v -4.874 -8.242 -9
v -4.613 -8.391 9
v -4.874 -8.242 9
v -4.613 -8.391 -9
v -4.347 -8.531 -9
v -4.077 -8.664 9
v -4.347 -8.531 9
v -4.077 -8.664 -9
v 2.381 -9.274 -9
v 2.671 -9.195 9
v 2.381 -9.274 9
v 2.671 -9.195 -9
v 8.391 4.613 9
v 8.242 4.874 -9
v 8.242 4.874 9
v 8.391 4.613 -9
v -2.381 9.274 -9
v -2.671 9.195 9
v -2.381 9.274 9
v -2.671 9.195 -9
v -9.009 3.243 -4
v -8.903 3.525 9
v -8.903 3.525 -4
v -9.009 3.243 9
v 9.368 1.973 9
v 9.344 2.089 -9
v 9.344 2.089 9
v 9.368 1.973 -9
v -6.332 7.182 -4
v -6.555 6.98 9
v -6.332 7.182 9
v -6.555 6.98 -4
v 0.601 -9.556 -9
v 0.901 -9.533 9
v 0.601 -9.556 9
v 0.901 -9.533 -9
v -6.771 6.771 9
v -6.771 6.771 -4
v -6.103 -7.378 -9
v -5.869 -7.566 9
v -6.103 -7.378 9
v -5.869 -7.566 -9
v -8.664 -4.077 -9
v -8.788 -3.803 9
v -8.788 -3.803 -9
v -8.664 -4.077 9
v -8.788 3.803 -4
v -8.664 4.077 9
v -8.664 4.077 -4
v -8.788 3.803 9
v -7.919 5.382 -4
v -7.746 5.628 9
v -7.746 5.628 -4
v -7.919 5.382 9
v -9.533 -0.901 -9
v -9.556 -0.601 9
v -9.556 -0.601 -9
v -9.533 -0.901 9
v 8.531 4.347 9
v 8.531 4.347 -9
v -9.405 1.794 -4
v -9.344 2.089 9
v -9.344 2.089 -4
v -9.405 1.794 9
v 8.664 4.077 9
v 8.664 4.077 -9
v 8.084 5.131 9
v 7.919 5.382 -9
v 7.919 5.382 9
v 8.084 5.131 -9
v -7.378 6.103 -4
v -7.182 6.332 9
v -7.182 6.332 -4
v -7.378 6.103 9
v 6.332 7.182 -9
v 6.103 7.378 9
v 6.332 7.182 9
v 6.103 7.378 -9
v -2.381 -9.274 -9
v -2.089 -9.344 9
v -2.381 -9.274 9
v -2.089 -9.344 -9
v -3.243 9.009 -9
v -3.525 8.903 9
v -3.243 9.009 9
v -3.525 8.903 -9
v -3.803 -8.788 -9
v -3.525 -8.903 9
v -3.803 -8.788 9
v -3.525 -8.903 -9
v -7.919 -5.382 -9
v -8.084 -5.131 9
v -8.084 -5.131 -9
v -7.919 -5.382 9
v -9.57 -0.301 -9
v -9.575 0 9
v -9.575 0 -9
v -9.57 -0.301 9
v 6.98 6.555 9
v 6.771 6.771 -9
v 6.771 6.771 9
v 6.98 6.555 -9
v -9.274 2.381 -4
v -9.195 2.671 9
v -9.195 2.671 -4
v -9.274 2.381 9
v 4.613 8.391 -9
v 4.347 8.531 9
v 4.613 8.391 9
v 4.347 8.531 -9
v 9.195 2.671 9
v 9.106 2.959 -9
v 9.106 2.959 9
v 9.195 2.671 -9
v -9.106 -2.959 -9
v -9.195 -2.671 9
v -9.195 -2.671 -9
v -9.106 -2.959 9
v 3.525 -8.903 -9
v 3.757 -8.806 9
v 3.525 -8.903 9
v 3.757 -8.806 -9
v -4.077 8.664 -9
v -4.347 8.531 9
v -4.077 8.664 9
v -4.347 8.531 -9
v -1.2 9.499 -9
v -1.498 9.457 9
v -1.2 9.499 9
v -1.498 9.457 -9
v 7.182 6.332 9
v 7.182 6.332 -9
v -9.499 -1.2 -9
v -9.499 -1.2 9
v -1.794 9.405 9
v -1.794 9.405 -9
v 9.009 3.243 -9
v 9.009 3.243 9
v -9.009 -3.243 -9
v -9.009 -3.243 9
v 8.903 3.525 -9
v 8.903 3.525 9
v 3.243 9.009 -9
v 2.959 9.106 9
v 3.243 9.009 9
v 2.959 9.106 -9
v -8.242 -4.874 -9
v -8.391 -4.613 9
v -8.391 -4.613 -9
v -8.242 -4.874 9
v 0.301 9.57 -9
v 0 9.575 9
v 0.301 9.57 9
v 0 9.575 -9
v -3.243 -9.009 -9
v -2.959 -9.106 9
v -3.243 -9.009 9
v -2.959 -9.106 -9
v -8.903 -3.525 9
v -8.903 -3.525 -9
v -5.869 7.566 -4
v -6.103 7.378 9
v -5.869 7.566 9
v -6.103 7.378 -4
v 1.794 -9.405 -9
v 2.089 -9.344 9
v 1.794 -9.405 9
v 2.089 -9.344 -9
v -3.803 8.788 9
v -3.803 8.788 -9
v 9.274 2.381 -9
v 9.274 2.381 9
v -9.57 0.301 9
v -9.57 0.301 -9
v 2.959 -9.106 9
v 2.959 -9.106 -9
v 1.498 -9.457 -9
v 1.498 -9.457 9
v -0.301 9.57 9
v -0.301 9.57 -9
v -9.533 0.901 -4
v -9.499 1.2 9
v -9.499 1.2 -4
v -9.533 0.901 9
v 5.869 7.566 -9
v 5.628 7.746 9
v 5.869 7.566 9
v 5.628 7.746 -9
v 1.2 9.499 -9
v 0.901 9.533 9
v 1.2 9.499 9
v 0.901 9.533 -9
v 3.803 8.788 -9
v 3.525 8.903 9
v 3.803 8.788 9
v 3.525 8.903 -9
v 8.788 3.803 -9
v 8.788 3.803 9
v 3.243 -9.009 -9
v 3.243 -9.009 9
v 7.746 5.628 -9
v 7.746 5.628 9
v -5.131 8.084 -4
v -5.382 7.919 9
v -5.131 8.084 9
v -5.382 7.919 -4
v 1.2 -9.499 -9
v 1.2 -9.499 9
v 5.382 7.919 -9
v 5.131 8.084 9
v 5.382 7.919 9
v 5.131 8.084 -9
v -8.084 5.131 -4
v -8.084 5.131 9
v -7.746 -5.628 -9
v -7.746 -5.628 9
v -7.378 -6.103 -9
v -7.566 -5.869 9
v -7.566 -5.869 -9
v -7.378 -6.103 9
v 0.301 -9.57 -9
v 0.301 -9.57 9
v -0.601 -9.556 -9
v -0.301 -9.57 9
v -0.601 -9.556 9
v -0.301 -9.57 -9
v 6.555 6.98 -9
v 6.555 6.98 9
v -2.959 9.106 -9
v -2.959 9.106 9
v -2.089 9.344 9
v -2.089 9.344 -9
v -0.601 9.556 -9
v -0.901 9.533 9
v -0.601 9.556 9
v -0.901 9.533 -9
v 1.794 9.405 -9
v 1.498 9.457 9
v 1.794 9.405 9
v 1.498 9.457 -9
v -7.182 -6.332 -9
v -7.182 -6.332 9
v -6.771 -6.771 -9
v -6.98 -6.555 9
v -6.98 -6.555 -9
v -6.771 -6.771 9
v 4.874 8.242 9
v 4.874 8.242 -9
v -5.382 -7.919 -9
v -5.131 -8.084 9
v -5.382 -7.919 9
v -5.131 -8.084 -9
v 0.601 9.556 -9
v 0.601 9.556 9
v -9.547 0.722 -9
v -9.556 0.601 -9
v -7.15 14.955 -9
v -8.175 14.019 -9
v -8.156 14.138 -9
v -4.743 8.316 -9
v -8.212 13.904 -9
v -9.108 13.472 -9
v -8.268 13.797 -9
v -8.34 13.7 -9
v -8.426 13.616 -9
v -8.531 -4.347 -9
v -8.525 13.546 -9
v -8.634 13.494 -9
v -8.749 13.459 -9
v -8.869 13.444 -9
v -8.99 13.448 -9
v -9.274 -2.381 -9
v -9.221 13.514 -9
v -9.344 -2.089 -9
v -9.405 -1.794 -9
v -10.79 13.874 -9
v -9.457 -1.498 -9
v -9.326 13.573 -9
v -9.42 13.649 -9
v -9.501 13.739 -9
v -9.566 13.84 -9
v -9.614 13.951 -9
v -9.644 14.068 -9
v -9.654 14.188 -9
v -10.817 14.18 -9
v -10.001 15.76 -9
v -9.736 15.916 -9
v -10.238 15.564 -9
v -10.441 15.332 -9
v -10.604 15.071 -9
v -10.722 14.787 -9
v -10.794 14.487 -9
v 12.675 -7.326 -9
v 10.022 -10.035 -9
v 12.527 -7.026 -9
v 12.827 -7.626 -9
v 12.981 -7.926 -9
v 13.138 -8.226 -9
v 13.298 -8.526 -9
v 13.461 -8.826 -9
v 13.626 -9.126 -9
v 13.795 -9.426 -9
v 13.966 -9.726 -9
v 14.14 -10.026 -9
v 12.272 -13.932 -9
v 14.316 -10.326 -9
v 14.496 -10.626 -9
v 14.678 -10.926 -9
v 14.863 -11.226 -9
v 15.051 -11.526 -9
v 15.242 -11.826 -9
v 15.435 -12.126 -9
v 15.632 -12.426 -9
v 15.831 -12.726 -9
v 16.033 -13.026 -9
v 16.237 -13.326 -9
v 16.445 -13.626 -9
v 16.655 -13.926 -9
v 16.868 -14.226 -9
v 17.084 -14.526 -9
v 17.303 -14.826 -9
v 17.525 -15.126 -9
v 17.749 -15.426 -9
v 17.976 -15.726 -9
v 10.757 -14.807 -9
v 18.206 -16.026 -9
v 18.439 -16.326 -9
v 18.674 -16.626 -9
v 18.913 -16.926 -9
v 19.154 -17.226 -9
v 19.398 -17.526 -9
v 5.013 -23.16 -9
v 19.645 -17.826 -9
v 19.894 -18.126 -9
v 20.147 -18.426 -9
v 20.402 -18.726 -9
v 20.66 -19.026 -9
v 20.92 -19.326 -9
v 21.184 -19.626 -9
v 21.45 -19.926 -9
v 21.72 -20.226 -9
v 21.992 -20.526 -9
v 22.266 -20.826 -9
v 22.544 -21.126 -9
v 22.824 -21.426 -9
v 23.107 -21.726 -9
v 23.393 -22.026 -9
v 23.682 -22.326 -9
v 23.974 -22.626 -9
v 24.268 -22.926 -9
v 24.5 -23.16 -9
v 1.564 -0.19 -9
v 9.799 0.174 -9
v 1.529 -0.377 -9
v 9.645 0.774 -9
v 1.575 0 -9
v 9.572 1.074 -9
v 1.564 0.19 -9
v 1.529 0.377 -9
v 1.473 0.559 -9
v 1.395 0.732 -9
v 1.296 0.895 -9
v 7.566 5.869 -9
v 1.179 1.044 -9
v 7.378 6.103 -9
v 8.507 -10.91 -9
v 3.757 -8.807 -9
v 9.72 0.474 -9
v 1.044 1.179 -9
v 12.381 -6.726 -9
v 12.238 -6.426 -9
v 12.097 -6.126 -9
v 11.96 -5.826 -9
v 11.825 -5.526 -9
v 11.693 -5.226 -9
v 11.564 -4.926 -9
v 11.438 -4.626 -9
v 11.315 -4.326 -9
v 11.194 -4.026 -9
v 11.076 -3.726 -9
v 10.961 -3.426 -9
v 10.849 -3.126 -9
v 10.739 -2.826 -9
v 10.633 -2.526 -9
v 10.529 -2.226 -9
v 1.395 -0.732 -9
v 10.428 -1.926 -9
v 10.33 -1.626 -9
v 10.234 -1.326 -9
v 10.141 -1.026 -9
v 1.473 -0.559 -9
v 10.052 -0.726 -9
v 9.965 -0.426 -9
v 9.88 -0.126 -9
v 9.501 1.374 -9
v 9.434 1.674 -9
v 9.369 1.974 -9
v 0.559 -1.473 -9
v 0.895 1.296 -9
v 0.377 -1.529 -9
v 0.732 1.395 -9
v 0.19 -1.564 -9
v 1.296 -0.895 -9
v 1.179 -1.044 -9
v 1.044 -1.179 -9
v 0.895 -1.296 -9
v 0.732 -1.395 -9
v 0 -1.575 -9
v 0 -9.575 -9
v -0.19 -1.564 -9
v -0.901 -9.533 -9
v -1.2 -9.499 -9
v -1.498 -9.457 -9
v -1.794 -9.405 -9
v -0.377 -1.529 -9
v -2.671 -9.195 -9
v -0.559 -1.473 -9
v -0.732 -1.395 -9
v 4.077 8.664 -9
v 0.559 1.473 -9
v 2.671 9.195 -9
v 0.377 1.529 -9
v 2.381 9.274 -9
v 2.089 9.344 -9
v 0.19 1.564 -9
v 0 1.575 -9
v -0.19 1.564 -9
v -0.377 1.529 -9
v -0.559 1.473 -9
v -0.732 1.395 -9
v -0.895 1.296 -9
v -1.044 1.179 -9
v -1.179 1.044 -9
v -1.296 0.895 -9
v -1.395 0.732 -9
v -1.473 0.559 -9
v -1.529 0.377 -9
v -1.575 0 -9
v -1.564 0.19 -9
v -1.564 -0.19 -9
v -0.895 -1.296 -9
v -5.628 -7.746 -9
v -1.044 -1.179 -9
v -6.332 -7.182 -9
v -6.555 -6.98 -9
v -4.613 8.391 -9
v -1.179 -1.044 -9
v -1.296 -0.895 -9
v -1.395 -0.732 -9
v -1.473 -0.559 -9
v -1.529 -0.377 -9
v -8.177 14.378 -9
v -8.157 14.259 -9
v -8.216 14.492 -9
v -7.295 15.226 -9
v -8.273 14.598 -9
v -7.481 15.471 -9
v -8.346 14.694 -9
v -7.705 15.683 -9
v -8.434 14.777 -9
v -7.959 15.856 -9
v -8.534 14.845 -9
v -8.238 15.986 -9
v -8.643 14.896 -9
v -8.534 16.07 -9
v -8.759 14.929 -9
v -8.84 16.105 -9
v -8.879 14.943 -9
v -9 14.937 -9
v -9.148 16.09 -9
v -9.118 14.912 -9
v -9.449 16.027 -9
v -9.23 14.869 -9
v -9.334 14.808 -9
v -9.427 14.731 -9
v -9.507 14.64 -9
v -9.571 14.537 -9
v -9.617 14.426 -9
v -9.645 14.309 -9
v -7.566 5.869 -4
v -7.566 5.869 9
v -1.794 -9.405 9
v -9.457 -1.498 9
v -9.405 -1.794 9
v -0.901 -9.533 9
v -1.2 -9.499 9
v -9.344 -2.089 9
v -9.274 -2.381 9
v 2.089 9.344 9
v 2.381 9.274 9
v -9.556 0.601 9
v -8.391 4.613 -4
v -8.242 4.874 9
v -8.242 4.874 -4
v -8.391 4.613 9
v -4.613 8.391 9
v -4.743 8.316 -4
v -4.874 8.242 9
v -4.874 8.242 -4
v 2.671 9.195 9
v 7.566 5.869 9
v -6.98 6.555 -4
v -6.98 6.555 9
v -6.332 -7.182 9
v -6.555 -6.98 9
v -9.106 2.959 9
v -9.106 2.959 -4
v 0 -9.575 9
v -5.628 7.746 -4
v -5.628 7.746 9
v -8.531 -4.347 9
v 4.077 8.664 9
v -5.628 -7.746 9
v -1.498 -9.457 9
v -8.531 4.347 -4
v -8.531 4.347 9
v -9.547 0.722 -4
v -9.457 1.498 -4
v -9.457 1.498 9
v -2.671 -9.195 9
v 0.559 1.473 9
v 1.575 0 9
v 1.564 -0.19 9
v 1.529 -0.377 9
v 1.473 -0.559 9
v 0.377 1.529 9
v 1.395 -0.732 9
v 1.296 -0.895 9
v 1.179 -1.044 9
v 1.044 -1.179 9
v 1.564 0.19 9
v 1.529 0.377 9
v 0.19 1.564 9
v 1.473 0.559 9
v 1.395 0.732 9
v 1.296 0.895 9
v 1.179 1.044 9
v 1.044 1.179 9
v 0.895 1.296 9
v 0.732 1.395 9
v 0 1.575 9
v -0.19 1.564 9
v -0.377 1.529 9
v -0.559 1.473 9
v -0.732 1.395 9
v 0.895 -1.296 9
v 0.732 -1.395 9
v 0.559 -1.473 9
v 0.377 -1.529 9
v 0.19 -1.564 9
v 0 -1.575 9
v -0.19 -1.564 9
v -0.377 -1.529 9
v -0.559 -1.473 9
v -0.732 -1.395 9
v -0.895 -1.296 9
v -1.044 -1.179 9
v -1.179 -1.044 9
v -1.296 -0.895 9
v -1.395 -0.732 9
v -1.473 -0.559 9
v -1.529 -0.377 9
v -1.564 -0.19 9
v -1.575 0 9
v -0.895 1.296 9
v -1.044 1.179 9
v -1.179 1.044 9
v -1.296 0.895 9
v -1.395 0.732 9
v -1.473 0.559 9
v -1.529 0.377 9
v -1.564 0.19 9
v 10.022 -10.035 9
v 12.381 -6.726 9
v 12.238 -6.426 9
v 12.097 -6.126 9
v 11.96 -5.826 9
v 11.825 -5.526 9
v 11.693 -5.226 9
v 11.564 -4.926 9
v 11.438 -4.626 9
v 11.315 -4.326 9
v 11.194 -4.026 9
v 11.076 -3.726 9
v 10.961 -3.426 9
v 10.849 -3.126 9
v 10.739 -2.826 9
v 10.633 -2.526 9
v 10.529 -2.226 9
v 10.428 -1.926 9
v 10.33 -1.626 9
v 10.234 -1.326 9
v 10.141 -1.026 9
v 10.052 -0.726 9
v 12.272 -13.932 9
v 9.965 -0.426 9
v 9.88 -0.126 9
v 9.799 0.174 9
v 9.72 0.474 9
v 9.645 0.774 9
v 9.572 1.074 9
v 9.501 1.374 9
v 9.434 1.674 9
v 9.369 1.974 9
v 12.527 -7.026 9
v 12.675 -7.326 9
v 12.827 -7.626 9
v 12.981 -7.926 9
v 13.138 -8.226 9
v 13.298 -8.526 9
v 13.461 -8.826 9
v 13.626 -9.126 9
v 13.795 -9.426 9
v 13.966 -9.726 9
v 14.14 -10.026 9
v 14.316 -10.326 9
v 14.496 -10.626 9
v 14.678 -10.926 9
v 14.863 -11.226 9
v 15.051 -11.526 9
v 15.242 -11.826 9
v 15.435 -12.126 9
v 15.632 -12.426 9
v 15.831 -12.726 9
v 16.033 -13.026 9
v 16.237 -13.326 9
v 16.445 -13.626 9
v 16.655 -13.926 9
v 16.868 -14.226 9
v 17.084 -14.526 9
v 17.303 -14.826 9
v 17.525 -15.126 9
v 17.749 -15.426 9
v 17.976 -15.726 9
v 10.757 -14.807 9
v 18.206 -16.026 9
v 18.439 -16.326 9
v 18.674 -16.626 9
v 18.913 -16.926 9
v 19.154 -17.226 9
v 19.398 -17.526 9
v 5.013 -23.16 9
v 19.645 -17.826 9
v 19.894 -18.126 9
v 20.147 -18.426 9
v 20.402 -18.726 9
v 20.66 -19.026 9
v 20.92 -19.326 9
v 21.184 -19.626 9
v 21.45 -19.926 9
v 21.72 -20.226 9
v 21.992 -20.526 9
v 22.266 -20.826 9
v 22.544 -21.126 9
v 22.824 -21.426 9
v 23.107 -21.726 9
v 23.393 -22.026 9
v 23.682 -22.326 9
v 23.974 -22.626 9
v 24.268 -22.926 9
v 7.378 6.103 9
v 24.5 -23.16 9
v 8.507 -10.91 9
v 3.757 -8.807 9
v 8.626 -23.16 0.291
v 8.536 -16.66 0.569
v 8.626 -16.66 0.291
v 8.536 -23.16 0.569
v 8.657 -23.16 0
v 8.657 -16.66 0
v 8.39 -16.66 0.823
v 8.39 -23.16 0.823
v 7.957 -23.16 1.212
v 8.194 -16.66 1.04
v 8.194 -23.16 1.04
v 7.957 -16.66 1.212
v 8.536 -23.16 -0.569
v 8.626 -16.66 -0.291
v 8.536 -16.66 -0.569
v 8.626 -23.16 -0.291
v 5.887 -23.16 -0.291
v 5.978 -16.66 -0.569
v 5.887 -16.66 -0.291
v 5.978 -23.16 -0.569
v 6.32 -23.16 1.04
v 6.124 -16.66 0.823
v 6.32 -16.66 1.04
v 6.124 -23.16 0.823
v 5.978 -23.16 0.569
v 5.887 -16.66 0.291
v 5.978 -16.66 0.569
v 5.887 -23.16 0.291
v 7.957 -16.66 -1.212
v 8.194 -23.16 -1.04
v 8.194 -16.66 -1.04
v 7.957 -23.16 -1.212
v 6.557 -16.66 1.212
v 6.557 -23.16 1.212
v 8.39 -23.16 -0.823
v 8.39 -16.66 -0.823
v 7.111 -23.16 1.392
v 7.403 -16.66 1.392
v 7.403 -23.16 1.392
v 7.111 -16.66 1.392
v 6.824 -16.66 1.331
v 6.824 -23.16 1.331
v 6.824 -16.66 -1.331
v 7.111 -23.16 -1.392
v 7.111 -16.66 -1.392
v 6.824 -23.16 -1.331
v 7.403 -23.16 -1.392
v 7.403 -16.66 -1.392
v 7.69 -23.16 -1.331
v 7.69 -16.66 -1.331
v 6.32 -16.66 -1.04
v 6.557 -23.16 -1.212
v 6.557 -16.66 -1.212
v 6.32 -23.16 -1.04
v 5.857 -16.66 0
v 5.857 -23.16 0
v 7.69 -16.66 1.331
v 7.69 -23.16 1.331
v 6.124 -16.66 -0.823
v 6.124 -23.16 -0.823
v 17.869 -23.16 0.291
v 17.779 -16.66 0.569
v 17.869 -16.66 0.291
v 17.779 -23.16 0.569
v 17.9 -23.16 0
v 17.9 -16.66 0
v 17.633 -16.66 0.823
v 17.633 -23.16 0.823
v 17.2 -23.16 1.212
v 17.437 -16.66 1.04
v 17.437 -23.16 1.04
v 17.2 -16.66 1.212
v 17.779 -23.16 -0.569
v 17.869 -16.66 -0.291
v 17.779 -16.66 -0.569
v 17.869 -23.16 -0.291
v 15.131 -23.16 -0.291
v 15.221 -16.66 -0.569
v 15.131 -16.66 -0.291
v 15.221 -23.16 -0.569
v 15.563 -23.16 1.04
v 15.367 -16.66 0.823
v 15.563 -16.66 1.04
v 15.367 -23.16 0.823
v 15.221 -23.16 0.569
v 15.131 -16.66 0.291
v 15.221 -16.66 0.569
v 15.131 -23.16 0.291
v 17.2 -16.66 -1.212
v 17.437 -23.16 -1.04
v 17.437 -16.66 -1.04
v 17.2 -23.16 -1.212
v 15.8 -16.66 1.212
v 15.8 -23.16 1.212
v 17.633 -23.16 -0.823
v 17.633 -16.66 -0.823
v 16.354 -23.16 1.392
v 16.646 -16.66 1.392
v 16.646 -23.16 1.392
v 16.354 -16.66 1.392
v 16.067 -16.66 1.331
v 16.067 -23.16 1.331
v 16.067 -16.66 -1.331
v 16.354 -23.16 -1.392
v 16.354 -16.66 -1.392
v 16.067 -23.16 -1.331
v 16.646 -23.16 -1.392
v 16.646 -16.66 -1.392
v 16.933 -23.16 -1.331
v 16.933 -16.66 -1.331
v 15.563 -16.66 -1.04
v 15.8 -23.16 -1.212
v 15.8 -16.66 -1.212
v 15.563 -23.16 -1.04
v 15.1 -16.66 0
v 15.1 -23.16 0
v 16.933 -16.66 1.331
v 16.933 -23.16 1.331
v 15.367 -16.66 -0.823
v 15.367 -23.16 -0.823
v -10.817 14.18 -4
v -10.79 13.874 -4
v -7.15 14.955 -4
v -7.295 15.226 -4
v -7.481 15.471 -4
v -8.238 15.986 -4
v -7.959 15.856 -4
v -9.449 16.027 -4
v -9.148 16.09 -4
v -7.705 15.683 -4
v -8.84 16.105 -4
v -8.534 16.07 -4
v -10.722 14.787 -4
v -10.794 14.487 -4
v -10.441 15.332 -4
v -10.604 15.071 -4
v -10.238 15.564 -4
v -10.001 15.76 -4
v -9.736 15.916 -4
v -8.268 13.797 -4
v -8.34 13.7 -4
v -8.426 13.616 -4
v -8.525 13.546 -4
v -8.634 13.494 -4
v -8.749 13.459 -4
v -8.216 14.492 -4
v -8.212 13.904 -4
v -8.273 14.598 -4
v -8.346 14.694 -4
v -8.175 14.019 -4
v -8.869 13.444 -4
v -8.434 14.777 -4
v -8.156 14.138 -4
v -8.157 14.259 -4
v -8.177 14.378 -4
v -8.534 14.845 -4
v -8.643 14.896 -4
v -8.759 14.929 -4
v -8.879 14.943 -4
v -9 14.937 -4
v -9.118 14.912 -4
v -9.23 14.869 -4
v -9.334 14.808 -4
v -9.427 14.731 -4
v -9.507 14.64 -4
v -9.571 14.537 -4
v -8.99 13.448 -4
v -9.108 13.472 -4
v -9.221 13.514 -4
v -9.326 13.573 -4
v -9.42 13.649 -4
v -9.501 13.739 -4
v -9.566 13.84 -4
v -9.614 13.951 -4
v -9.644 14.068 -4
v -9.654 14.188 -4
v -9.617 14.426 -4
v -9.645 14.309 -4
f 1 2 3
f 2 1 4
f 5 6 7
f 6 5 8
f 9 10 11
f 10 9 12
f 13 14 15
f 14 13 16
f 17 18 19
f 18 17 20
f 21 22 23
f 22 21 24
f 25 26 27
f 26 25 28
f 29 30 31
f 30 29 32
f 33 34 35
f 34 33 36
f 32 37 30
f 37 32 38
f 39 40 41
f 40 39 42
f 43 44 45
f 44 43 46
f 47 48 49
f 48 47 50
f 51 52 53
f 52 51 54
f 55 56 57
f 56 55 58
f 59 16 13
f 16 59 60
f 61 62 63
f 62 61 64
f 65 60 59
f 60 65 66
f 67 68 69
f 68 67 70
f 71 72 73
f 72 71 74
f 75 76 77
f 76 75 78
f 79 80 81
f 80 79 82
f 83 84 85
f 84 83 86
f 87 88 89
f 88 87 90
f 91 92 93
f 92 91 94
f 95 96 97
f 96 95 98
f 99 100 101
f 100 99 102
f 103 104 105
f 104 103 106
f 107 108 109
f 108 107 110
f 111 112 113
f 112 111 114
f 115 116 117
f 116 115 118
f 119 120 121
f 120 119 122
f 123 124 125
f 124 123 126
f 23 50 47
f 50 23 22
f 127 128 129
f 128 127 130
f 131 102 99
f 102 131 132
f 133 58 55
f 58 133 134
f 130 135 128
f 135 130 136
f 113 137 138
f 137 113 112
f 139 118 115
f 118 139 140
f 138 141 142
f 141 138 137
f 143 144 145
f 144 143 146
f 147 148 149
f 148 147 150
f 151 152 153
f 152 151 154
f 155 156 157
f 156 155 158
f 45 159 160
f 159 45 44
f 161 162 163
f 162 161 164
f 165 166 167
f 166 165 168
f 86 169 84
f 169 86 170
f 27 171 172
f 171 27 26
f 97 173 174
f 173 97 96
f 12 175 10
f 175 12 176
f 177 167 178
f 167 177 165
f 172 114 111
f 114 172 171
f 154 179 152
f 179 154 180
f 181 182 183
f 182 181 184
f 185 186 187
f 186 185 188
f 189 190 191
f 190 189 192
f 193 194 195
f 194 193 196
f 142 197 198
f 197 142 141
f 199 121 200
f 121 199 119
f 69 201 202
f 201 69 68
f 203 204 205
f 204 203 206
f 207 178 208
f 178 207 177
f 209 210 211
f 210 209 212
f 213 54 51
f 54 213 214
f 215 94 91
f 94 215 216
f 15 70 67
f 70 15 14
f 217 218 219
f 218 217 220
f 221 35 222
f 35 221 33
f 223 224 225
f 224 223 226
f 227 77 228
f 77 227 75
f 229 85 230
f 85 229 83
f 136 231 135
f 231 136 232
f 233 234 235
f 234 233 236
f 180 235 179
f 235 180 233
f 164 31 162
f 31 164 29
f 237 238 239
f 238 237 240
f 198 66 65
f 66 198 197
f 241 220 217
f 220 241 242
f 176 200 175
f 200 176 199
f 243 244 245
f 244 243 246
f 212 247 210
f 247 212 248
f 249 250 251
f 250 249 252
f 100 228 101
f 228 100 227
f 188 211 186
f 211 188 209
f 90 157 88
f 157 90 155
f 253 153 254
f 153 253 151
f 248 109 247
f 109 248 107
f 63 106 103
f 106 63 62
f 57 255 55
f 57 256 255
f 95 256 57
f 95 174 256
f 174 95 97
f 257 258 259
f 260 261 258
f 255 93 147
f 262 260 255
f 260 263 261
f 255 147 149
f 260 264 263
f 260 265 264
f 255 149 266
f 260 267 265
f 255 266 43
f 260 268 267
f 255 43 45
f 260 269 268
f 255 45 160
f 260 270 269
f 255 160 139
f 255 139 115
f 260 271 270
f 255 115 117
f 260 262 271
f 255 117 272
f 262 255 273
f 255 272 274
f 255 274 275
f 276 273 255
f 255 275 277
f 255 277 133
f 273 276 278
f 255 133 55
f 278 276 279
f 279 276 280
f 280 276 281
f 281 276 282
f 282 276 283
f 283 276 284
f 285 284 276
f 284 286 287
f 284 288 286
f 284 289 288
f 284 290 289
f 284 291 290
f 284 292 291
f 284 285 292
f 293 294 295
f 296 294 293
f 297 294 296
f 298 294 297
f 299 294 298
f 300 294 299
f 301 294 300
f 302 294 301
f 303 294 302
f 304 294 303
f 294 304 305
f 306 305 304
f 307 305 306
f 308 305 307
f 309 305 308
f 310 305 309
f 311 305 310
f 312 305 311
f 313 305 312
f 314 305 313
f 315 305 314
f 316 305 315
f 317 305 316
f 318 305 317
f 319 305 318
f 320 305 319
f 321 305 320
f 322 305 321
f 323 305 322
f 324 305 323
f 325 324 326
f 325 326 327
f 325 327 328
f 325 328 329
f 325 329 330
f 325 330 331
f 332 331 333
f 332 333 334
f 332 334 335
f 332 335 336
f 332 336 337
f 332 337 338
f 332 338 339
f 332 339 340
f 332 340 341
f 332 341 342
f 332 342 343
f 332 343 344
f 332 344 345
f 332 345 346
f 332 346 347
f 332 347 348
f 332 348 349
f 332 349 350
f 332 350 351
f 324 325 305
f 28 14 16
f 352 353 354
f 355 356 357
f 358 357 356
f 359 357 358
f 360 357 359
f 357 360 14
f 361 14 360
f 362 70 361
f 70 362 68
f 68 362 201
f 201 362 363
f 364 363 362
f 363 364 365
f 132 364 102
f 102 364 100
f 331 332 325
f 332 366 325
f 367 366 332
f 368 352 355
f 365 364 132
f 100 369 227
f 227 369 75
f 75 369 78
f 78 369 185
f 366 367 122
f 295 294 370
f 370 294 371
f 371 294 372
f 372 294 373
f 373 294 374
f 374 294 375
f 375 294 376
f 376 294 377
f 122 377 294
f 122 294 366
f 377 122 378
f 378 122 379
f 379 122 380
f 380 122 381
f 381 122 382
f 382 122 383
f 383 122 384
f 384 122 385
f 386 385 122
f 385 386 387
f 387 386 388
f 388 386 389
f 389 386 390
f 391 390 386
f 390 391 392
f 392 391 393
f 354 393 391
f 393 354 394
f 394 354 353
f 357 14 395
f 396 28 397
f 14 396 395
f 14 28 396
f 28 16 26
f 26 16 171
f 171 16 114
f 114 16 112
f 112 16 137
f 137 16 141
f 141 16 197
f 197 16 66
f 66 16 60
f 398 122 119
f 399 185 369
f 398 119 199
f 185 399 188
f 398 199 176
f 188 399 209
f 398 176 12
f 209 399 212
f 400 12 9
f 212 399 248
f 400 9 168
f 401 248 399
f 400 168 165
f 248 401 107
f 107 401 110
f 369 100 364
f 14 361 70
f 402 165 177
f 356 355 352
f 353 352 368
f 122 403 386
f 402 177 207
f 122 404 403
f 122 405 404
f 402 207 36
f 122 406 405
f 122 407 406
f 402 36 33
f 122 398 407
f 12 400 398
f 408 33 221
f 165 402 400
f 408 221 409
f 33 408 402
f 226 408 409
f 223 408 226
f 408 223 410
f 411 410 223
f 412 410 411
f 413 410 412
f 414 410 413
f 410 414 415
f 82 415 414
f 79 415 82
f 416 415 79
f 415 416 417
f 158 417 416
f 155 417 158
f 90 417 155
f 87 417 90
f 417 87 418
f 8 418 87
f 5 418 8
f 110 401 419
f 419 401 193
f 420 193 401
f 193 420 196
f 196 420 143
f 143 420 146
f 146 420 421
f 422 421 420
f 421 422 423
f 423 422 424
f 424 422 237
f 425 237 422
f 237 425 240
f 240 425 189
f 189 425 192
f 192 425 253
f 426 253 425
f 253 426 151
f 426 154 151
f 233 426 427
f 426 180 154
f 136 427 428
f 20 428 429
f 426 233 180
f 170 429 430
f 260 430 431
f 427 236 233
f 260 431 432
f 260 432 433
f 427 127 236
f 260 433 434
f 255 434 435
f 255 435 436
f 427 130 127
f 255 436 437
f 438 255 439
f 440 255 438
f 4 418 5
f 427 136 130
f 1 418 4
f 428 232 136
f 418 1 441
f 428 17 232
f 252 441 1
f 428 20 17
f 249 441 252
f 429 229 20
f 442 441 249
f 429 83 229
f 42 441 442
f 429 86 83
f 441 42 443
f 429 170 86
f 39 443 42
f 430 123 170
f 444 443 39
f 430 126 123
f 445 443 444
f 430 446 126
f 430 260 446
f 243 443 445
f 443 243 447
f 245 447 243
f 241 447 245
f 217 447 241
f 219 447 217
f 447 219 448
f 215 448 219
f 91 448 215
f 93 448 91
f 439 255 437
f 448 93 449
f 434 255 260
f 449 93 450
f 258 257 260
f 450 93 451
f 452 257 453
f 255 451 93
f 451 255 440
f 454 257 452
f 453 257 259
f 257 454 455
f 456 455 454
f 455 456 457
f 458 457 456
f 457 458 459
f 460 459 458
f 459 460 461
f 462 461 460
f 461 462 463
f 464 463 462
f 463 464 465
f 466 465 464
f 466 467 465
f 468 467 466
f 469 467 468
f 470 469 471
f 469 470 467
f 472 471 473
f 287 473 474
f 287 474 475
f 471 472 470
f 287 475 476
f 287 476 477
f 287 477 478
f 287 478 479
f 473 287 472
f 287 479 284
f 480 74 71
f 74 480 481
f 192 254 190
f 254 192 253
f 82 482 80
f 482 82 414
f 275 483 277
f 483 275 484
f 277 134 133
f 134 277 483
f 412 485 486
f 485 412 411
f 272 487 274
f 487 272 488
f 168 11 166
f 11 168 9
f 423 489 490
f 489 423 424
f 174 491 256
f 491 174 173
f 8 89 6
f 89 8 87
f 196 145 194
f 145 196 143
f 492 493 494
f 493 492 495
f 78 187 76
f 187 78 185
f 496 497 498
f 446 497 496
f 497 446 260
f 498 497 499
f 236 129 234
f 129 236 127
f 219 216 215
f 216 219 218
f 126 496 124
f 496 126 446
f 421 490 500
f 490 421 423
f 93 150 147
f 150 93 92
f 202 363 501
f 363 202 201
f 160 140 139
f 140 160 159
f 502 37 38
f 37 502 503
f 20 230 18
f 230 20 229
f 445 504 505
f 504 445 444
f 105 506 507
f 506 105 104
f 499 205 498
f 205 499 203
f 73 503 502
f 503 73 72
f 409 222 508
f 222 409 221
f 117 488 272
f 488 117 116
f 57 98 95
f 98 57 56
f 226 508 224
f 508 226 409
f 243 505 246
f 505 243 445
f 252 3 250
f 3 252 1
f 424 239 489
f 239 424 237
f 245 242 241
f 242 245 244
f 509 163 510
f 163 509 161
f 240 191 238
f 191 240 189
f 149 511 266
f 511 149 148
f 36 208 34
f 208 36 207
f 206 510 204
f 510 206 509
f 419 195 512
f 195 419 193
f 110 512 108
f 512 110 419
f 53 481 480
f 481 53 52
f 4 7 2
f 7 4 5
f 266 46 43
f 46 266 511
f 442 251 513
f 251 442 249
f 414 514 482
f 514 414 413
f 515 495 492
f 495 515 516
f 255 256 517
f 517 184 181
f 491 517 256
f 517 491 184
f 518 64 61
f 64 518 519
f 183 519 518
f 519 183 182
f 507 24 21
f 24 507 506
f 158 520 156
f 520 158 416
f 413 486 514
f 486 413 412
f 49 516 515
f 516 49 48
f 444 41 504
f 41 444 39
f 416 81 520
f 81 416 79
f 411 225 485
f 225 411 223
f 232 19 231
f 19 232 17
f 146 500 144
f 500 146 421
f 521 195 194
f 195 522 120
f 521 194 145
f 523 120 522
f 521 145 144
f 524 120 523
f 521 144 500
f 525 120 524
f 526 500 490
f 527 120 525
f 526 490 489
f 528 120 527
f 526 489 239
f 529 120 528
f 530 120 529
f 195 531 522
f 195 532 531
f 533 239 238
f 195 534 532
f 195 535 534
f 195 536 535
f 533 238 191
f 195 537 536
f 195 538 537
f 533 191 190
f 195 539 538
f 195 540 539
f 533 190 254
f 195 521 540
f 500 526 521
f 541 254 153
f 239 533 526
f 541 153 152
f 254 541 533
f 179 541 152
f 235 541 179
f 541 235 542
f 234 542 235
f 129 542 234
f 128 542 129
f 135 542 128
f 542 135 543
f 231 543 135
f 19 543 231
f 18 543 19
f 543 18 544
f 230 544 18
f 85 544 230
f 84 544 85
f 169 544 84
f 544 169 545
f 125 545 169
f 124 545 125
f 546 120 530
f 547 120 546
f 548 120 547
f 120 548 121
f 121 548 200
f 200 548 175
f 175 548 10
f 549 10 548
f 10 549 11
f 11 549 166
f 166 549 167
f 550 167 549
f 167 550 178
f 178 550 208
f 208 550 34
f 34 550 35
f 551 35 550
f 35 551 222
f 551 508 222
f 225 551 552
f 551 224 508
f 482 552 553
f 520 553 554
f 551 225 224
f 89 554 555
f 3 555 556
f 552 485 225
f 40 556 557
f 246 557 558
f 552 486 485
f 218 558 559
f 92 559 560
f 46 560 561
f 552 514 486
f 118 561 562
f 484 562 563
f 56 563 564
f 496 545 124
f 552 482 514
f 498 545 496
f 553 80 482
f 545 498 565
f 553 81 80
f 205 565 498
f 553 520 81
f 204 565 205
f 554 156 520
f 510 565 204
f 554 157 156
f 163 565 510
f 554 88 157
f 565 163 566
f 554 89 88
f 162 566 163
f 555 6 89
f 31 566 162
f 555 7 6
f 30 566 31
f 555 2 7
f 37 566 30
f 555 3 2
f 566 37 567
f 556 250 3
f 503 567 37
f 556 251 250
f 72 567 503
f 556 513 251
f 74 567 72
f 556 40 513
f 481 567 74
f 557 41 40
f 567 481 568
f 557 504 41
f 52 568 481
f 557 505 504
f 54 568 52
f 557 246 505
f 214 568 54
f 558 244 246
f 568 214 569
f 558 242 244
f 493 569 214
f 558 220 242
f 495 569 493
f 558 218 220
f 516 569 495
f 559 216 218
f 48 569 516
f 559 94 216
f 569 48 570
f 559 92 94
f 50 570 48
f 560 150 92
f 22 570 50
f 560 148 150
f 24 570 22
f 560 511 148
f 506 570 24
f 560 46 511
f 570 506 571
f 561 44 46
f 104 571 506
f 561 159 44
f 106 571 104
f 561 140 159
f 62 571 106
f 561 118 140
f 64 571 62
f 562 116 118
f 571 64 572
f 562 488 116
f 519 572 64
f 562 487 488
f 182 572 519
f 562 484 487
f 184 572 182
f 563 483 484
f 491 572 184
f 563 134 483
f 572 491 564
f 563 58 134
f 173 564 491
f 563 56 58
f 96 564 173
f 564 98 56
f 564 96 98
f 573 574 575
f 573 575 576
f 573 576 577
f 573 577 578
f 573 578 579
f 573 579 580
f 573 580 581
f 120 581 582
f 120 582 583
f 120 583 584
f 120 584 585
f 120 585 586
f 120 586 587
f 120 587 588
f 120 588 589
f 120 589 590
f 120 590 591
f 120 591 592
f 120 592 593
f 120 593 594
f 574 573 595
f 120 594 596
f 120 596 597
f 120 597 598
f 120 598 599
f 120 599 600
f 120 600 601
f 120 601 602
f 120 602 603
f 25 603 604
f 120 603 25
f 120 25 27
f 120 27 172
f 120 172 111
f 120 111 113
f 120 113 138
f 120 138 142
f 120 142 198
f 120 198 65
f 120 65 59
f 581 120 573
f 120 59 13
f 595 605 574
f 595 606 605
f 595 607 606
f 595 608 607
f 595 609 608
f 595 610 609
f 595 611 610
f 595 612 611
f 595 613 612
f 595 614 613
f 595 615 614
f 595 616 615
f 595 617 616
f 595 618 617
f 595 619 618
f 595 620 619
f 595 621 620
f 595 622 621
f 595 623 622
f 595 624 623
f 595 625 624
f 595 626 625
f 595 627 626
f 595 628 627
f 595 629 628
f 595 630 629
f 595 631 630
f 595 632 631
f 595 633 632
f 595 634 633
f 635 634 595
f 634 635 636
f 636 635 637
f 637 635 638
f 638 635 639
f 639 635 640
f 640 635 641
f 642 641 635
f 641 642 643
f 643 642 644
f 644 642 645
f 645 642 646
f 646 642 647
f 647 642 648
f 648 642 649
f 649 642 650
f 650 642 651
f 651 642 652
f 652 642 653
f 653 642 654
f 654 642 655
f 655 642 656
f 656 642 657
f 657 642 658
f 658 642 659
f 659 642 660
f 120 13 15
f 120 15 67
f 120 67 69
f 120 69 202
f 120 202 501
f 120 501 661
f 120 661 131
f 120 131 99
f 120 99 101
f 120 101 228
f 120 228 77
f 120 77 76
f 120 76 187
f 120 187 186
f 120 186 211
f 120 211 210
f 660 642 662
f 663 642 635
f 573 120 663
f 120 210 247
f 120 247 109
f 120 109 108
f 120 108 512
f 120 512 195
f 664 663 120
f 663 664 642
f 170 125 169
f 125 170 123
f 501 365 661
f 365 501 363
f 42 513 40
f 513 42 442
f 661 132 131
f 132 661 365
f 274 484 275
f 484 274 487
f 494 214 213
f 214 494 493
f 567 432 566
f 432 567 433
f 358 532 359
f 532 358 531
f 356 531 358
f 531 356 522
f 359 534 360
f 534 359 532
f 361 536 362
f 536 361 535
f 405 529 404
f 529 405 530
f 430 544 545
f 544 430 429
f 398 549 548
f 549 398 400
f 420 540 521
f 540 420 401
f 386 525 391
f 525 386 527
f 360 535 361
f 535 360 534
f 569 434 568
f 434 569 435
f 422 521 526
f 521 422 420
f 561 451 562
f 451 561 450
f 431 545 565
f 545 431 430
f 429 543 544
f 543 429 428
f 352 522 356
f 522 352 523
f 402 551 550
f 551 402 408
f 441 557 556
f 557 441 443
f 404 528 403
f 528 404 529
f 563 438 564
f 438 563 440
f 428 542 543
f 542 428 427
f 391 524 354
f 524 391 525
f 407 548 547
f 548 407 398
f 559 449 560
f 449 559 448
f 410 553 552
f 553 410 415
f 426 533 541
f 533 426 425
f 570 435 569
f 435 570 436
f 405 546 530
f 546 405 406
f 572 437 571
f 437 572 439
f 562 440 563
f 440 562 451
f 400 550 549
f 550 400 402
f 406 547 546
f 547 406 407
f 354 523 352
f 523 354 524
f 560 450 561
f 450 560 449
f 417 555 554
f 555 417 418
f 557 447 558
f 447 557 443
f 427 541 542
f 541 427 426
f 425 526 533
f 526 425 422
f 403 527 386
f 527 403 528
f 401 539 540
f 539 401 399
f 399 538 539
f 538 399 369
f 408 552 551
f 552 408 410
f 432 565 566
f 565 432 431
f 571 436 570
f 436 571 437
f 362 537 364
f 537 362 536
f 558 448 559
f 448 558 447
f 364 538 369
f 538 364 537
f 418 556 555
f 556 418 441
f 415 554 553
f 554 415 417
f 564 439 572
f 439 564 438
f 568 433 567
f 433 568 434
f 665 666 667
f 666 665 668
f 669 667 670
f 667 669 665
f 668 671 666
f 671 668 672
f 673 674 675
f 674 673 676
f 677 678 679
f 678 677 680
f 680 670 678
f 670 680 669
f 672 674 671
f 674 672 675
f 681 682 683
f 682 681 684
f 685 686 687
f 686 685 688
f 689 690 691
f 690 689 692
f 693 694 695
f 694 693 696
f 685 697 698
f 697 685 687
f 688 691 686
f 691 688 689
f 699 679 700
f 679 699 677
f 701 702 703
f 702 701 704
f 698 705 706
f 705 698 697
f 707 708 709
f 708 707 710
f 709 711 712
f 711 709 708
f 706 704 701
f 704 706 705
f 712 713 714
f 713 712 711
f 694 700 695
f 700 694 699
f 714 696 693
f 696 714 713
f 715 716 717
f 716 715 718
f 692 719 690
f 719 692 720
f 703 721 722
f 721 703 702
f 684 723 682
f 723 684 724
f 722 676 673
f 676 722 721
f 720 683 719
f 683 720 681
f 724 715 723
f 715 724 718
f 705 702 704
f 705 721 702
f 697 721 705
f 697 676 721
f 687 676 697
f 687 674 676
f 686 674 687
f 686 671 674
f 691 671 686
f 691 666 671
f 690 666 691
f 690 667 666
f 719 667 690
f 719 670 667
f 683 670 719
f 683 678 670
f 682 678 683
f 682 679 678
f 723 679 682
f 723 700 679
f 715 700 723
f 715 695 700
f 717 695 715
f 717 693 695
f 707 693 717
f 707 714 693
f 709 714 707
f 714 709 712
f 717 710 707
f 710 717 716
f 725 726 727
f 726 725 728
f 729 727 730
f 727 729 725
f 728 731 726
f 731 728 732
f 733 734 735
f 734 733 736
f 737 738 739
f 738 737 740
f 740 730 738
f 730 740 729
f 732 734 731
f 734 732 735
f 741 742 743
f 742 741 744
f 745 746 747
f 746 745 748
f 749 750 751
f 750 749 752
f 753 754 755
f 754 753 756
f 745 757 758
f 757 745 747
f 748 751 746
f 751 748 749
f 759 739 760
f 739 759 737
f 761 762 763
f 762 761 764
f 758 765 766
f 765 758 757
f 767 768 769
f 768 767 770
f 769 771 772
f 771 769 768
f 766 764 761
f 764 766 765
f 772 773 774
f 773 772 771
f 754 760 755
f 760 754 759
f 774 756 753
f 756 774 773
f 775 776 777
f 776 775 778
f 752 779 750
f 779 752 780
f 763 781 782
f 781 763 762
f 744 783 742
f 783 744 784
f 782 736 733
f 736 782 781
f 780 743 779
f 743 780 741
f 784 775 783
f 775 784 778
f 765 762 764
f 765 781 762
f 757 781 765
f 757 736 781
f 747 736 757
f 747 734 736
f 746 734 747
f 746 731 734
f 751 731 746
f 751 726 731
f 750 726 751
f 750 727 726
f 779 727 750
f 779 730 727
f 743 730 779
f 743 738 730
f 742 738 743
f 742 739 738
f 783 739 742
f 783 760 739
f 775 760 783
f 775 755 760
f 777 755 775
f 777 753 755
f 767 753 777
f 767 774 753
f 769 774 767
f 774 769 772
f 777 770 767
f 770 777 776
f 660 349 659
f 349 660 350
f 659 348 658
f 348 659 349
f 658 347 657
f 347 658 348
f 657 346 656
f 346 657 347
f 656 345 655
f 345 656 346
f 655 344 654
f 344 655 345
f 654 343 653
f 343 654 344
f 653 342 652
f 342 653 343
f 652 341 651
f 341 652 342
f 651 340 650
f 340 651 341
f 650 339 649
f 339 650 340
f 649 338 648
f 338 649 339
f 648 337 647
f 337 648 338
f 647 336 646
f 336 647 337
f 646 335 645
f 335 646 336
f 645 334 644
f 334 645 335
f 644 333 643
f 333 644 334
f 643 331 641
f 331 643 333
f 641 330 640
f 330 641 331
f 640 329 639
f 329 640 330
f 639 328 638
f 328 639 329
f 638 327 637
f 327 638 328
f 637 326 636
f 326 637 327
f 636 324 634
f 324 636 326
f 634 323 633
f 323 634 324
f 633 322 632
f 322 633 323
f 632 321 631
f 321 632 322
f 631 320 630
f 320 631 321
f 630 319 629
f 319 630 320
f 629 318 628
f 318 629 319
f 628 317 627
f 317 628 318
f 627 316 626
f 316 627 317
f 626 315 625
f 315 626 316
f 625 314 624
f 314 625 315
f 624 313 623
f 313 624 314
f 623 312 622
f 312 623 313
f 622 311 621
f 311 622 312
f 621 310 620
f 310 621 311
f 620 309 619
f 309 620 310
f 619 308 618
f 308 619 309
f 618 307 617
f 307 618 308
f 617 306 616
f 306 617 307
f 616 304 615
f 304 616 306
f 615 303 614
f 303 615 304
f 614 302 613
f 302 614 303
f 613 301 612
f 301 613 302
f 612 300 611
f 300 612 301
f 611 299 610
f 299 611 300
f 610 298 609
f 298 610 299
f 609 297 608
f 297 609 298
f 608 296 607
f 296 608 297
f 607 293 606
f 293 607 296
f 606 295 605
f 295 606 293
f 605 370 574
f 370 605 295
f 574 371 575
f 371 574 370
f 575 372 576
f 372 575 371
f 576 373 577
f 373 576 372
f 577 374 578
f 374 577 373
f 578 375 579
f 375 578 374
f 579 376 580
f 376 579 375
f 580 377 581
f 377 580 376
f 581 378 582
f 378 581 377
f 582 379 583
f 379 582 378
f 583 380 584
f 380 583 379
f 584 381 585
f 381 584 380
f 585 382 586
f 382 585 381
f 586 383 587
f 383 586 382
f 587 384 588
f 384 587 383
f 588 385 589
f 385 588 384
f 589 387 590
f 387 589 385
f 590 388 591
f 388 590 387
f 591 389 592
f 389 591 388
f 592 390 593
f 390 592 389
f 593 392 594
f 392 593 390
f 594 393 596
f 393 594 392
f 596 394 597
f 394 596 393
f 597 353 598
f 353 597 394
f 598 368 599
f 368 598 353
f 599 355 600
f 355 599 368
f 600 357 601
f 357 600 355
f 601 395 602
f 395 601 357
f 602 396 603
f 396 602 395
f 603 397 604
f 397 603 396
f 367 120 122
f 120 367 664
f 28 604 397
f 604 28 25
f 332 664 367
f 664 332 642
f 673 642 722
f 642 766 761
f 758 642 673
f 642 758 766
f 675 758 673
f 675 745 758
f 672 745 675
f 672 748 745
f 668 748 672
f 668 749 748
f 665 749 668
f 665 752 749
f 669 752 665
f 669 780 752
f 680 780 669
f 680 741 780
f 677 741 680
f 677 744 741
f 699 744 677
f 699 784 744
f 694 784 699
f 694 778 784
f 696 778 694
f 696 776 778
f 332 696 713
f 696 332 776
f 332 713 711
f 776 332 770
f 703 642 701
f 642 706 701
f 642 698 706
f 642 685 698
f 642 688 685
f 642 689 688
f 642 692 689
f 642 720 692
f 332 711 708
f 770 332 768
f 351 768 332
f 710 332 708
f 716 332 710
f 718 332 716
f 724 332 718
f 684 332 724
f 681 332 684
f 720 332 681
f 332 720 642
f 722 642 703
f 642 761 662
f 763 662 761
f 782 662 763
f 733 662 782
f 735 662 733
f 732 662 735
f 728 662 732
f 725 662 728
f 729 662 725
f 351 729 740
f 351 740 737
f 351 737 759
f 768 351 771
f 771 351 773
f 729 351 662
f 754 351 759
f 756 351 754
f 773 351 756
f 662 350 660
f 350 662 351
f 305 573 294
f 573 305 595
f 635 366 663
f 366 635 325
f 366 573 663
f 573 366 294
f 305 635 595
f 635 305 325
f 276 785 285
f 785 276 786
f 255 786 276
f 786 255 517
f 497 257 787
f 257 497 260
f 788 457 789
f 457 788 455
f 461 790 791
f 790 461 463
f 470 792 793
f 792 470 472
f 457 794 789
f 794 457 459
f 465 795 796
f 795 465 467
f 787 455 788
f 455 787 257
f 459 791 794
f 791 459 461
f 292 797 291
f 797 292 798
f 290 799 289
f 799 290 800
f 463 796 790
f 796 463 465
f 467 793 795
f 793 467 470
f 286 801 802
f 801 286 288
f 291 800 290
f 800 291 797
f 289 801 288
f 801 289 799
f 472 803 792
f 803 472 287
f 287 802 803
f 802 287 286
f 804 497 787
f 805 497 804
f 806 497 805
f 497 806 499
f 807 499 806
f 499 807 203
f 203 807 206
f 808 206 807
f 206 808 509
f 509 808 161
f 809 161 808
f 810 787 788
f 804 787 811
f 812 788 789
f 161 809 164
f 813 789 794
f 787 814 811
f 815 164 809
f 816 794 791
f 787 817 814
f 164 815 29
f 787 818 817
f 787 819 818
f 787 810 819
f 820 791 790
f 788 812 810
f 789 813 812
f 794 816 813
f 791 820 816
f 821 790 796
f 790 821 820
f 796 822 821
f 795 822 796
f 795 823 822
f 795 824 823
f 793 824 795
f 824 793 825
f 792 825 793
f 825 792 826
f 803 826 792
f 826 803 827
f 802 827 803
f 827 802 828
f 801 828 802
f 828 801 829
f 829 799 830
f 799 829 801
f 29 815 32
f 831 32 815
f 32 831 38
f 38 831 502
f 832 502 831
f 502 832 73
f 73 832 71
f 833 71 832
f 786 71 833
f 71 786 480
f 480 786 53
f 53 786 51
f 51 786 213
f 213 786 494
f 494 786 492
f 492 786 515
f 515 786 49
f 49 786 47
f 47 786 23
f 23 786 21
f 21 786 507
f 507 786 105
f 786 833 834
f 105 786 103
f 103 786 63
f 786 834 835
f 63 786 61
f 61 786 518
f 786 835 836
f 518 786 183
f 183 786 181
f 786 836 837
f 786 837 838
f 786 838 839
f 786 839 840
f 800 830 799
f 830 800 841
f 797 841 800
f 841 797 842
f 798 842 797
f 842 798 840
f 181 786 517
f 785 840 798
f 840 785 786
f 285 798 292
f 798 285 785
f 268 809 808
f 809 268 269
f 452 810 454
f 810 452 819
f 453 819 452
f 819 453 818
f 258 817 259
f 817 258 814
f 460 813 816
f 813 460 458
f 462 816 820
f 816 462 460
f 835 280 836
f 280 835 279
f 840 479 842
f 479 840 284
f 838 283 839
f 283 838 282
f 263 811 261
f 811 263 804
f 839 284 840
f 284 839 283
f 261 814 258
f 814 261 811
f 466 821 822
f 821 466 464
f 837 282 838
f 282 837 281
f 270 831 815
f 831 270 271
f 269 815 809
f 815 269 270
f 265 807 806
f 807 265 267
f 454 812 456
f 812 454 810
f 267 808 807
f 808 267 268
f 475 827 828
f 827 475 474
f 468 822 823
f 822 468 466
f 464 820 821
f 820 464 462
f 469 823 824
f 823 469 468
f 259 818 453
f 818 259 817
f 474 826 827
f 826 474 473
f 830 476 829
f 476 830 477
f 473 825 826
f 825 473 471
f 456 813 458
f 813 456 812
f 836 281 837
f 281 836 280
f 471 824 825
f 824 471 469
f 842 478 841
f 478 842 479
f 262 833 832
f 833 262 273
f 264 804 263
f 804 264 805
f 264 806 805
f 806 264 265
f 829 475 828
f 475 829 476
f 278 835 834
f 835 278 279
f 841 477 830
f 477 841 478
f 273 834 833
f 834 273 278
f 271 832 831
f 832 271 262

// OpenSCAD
// file: wigleUnit.scad
include <utils.scad>;
include <design.scad>;

build = 0;


module wigle_cyl(theta, A_in, A_out, t, wall_t, R, phi0, phi1, cyl, a){
    

    rotate_extrude(angle = phi1 - phi0, $fa = dTHETA, $fs = dt) wigle(theta, A_in, A_out, t, wall_t, R, 0, cyl, a);
    }

module wigle_bar(theta, A_in, A_out, t, wall_t, L, solid, cyl, a){
    translate([0, -9*wall_t, 0]) rotate([90,0,90]) linear_extrude(height = L, $fn = 2)
        
    wigle(theta, A_in, A_out, t, wall_t, 10*wall_t, solid, cyl, a);
}

module wigle(theta, A_in, A_out, t, wall_t, R, solid, cyl, a){
    
    
    // Wigle
    function fx(i,a,A,t, phase) = A*pow(sin(phase + 180*i/a), 2); 
    function fy(i,a,t) = t*i/a;
    
    
    theta_in = solid == 1 ? 0 : theta;
    A_in_ = solid == 1 ? 0 : A_in;
    t_in = solid == 1 ? t*cos(theta) : t;
    
    // SINE CORNER:
    points_in = [for (i=[0:1:a]) [max(0, R + cos(theta_in)*fx(i,a,A_in_,t_in,theta_in/2) + sin(theta_in)*fy(a-i,a,t_in) - wall_t), -sin(theta_in)*fx(i,a,A_in_,t_in,theta_in/2) + cos(theta_in)*fy(a-i,a,t_in)]];
    points_out = [for (i=[0:1:a]) [max(0, R + cos(theta)*fx(i,a,A_out,t, 0) + sin(theta)*fy(i,a,t)), -sin(theta)*fx(i,a,A_out,t,0) + cos(theta)*fy(i,a,t)]];
    points_wigle = concat(points_in, points_out);
    
    
    // SPHERE CORNER:
    function fx_sphere(i,a,t) = t*cos(theta + (90-theta)*i/a) - t*cos(theta); 
    function fy_sphere(i,a,t) = t*sin(theta + (90-theta)*i/a) - t*sin(theta);
    function fy_straight(i,a,t) = i/a*t*(1-sin(theta)); 
    
    points_in_sphere = [for (i=[0:1:a]) [max(0, R - max(wall_t, t*cos(theta))), max(0, fy_straight(i,a,t))]];
    points_out_sphere = [for (i=[a:-1:0]) [max(0, R + fx_sphere(i,a,t)),max(0, fy_sphere(i,a,t))]];
    points_sphere = concat(points_in_sphere, points_out_sphere);
    

    // FULL SPHERE CORNER:
    r = wall_t*cos(theta)/2;
    hy = t - r;
    
    function fx_full_sphere(i,a, t, hy, wall_t, theta) = r*cos(theta + 180*i/a) - hy*sin(theta) + r*cos(-theta); 
    function fy_full_sphere(i,a, t, hy, wall_t, theta) = r*sin(theta + 180*i/a) + hy*cos(-theta);
    
    
    points_full_sphere = [for (i=[0:1:a]) [max(0, R - fx_full_sphere(i,a, t, hy, wall_t, theta)), fy_full_sphere(i,a, t, hy, wall_t, theta)], [R, 0], [R - wall_t, 0]];
    

    // SELECT:    
    points = cyl==0 ? points_wigle : cyl==1 ? points_sphere : cyl==2 ? points_full_sphere : 1;
    
    polygon(points);
    
}


module wigle_wigle_square(wx, wy, r, theta, A_in, A_out, t, wall_t, cyl, a){
      
    
    a1 = r*360/(50*Pi)/t*a;
    echo(a1);
    intersection(){
        wigle_square(wx, wy, r, theta, 0, 0, t, max(wx, wy), 0, a);
        union(){
            for (i=[0:1:max(wx,wy)/t+1]){
                rotate_extrude($fn = a1, $fs = .01) translate([(1+i)*t,0,0]) rotate([0,0,90]) wigle(0, 0, A_out, t, wall_t, wall_t, 0, cyl, a);
            }
        }
    }
}


module wigle_square(wx, wy, r, theta, A_in, A_out, t, wall_t, cyl, a){
    
    module corner(){
        // corner:
        translate([wx/2 - r, wy/2 - r, 0]) wigle_cyl(theta, A_in, A_out, t, wall_t, r, 0, 90, cyl, a);
        
        x_ = wy/2 - wx/2;
        points = [[0, 8*wy], [wy, x_ + wy], [0, wy/2 - wx/2]];
        //sides
        
        wall_t_y = min(wall_t, wy/2);
        solid = wy/2 < wall_t ? 1 : 0;
        intersection(){
            translate([0, wy/2 - wall_t_y, 0]) wigle_bar(theta, A_in, A_out, t, wall_t_y, wx/2 - r, solid, cyl, a);
            linear_extrude(height = t+1) polygon(points);
        }
        
        wall_t_x = min(wall_t, wx/2);
        solid = wx/2 < wall_t ? 1 : 0;
        difference(){
            translate([wx/2 - wall_t_x, 0, 0]) mirror([0,1,0])rotate([0,0,-90]) wigle_bar(theta, A_in, A_out, t, wall_t_x, wy/2 - r, solid, cyl, a);
            linear_extrude(height = t+1) polygon(points);
        }
    }
    
    
    union() {
        corner();
        mirror([1,0,0])corner();
        mirror([0,1,0])corner();
        mirror([1,0,0]) mirror([0,1,0])corner();
    }
}
// file: utils.scad
use <wigleUnit.scad>;
//include <design.scad>;


dt_utils = .3;
dTHETA_utils = 10;

function get_bolt_sink(boltD, add) = boltD/2 + add;

function add(v, i = 0, r = 0) = i < len(v) ? add(v, i + 1, r + v[i]) : r;

function select(vector,indices) = [ for (index = indices) vector[index] ];


function width_scale(sc,sc2, x, mid) = 1 + x*(pow(mid,3)*sc2 - pow(mid,3) + 3*mid - sc*(3*mid - 2)-2)/(mid*(pow(mid,2) - 2*mid + 1)) + pow(x,3)*(pow(mid,2)*sc2 - pow(mid,2) + 2*mid - sc*(2*mid-1) - 1)/(pow(mid,2)*(pow(mid,2) - 2*mid + 1)) + pow(x,2)*(-2*pow(mid,3)*sc2 + 2*pow(mid,3) -3*pow(mid,2) + sc*(3*pow(mid,2) - 1) + 1)/(pow(mid,2)*(pow(mid,2) - 2*mid + 1));


function theta(sc, sc2, i, ni, mid, t, wx) = asin((width_scale(sc,sc2, (i+1)/ni, mid) - width_scale(sc,sc2, i/ni, mid))*wx/(2*t));


function heights(sc, sc2, mid, t, w, ni) = [for (i=[0:1:ni]) t*cos(theta(sc, sc2, i, ni, mid, t, w))];


// shell:
module shell(wall_t, sc, sc2, mid, t, wx, wy, r_corner, ni, A_in, A_out, a){
    heights_ = heights(sc, sc2, mid, t, wx, ni);
    color("DarkSlateGray") 
    union(){
    for (i=[0:1:ni]){
        wx_ = width_scale(sc,sc2, i/ni, mid)*wx;
        wy_ = width_scale(sc,sc2, i/ni, mid)*wy;
        r_corner_ = width_scale(sc,sc2, i/ni, mid)*r_corner;
        
        theta_ = theta(sc, sc2, i, ni, mid, t, wx);
        h = add(select(heights_, [0:1:i-1]));
        translate([0,0,h]) wigle_square(wx_, wy, r_corner, theta_, A_in, A_out, t, wall_t, 0, a);
    }
    }
}

module bolt(L, r, a){
    h_ = 2*r/sqrt(3);
    r2_ = 2*r;
    a = 40;
    cylinder(r = r, h = L, $fn = a);
    translate([0,0,L])cylinder(r1 = r, r2 = r2_, h = h_, $fs = dt_utils/2, $fa = dTHETA_utils);
    translate([0,0,L+h_])cylinder(r1 = r2_, r2 = r2_, h = r2_, $fs = dt_utils/2, $fa = dTHETA_utils);
    }

module bolt_new(L, r, a){
    h_ = 2*r/sqrt(3);
    r2_ = 2*r;
    h_base = 2*r2_;
    
    translate([0,0,-L])cylinder(r = r, h = L, $fs = dt_utils, $fa = dTHETA_utils);
    cylinder(r1 = r, r2 = r2_, h = h_, $fs = dt_utils, $fa = dTHETA_utils);
    translate([0,0,h_])cylinder(r1 = r2_, r2 = r2_, h = h_base, $fs = dt_utils, $fa = dTHETA_utils);
}
    
    
bolt_new(20, 1.5, 20);
// file: design.scad
use <utils.scad>;

Pi = 3.141592653589793;
dt = .3;


A = 1;
A_in = A; //A;
A_out = A; //A;
wall_t = .66;
t = 4;

wx = 57.5; //echo(15 + 35 + 1.5 + 2 + 4);
wy = 69;
r_corner = wx/10;
H_ = 124;
ni = floor(H_/t);
H = t*(ni+1);
sc = 1.;
sc2 = 1.;
mid = .65;
w_rim = 4;     
a = floor(t/dt);
echo("a = ", a);
echo("Height = ", H);


    
// BOTS:
d3bolt = 3;
d3bolt_t = 2.8;

// NEMA
nema_spacing = .3;
nema14_x = 35.2 + nema_spacing;
nema14_y = 35.2 + nema_spacing;
nema14_z = 23.0 + nema_spacing;
corner_cut = 2  + nema_spacing;
nema_L_axle = 17;
nema_r_axle = 5/2  + nema_spacing;
nema_bolt_d = d3bolt;
nema_L_bolt = 5;

middle_cyl_r = 11  + nema_spacing;
middle_cyl_h = 2  + nema_spacing;

// DUE dimensions:
due_width = 53.21;
due_length = 104.47;
due_hole_w = 48.26;
due_d_bolt = d3bolt;


move_up = due_length - 15.24 - 6.68 + 6;
x_hole_due  = due_hole_w/2;
hole_coord_due = [[-x_hole_due, move_up, 0], 
                  [x_hole_due, move_up-1.27, 0],
                  [x_hole_due, move_up-76.43, 0],  
                  [-x_hole_due + 5 + 27.94, move_up-76.43 + 24.13, 0],  
                  [-x_hole_due, move_up-82.55, 0],
                  [-x_hole_due + 5, move_up-82.55 + 30.48, 0]
                  ];
                  
bolt_coord_due = hole_coord_due;

// rpi dimensions:
rpi_width = 31;
rpi_length = 69;
rpi_hole_w = 23;
rpi_hole_l = 58;
rpi_d_bolt = 2.8;

x_hole_rpi  = rpi_hole_w/2;
hole_coord_rpi = [[-x_hole_rpi, 0, 0], [x_hole_rpi, 0, 0], [-x_hole_rpi, rpi_hole_l, 0],  [x_hole_rpi, rpi_hole_l, 0]];
bolt_coord_rpi = hole_coord_rpi;


// HAND PARAMS:
sc_hand = 1.;
sc2_hand = 1;
wx_hand = 14;
wy_hand = wx_hand;
r_corner_hand = wx_hand/8;
L_hand = 72;
ni_hand = ceil(L_hand/t);
mid_hand = .8;
rot_hand = 0;
//hand_axle_h = H - nema14_x/2 - 26;
//hand_axle_h = t + 3*nema14_x/2 + 27;
hand_axle_h = H - nema14_x/2 - t; 
hand_z = hand_axle_h; // -ni_hand*t;
t_motor_mount = 4;
hand_shift = 6;
hand_y = wy/2 + wy_hand - 2*t_motor_mount;
axle_x = wx/2 - nema14_x/2 - 1.5;
bolt_wall_t = .7;


echo("Top h = ", H - hand_axle_h - nema14_x/2);

// STEPPER CONTROLLERS
x_hole_stepper = wx/2 - r_corner;
stepper_z0 = t + nema14_x + t;
stepper_z1 = hand_axle_h - nema14_x/2 - t;
stepper_h = stepper_z1 - stepper_z0;


//hole_coord_step = [for (i=[-1,1]) for (j=[0,1]) [i*x_hole_stepper, stepper_z0 + j*stepper_h]];
//bolt_coord_step = hole_coord_step;
hole_coord_step = [];
bolt_coord_step = hole_coord_step;

// BATTERY MOUNT
x_hole_battery = 0;
battery_z0 = t + nema14_x - t;
battery_z1 = hand_axle_h - nema14_x/2 + t;
battery_h = battery_z1 - battery_z0;

hole_coord_battery = [for (j=[0,1]) [x_hole_battery, battery_z0 + j*battery_h]];
bolt_coord_battery = hole_coord_battery;



// MPU6050 GYRO
hole_x_mpu = 0;
hole_y_mpu = 8;
hole_coord_mpu = [for (j=[-1,1])[hole_x_mpu, j*hole_y_mpu]];
bolt_coord_mpu = hole_coord_mpu;

// LEG PARAMS
sc_leg = 1;
sc2_leg = 1.;
mid_leg = .6;
wx_leg = 22;
wy_leg = wx_leg;
r_corner_leg = 2;
ni_leg = 6;
wheel_angle = 0;
//leg_y = wy/2*sc + wy_leg - t_motor_mount - t_motor_mount;

// HEAD PARAMS:
spacing = 4; // distance between rpi and walls
wx_head = rpi_width + wall_t*2 + spacing;
wy_head = wx_head;
r_corner_head = wx_head/10;
ni_head = ceil(75/t);
head_x = -7;

sc_head = 1;
sc2_head = 1;
mid_head = .5;
w_rim_head = w_rim;
heights_head = heights(sc_head, sc2_head, mid_head, t, wx_head, ni_head);

// NECK PARAMS
neck_t = 18;
axle_wall_t = 8;
neck_axle_d = 3.15;
r_pivot_circle = neck_axle_d/2 + axle_wall_t;

neck_h = wx_head/2 + A_out + 4;
axle_d_from_wall = 1;
neck_width = 23.5;

neck_pivot_angle_min = -5;
neck_pivot_angle_max = 60;

// COVER PARAMS
thickness_bottom = 2;
bottom_rim_w = 1;
//lid_spacing_scale = .0;
lid_spacing = .3;
switch_d = 5;


// MISC PARAMS
heights_ = heights(sc, sc2, mid, t, wx, ni);
el_mount_h = 3.5;
bolt_sink = 1.2;
// main file
include <design.scad>;



function get_fn(d, t) = floor(d/t);

module pivot(){
    
    difference() {
        cylinder(r = r_pivot_circle, h = neck_t, $fn = floor(2*Pi*r_pivot_circle/dt));
        cylinder(r = neck_axle_d/2, h = neck_t, $fn = 4*a);
    }
} 


module neck(neck_h, pivot_point, pivot_angle_min, pivot_angle_max, axle_d_from_wall, mode){
    
    // This amount of angle needs to be added to the contact angle due to the 
    // bottom thickness.
    add_angle = asin((axle_d_from_wall + neck_axle_d/2 + .4)/r_pivot_circle);
    phi_up = pivot_angle_max + add_angle;
    phi_low = -pivot_angle_min + add_angle;
    alpha_up = 90 - phi_up;
    alpha_low = 90 - phi_low;
    neck_contact_point_up = pivot_point + [r_pivot_circle*cos(alpha_up), r_pivot_circle*sin(alpha_up), 0];
    neck_contact_point_low = pivot_point + [r_pivot_circle*cos(-alpha_low), r_pivot_circle*sin(-alpha_low), 0];
    
    x1l = neck_contact_point_low[0];
    y1l = neck_contact_point_low[1];
    
        
    x1 = neck_contact_point_up[0];
    y1 = neck_contact_point_up[1];
    
    x0 = neck_width;
    a = (x0 - x1 + y1*tan(-alpha_up))/pow(y1,2);
    b = (-2*x0 + 2*x1 - y1*tan(-alpha_up))/y1;
    c = x0;
    
    function y2_(y) = [a*pow(y,2) + b*y + c, y];
    
    points = [for (y=[y1:-dt:0]) y2_(y), [x0, 0], [x1l-y1l*tan(pivot_angle_min),0], [x1l, y1l]];
    
    module bolts_(){
        for (x=[x1l+3.5, x0-8]){
            translate([x, -.5, neck_t/2]) rotate([90,0,0]) bolt_new(7, 1.4, 20);
        }
    }
    
    difference(){
        linear_extrude(height = neck_t) polygon(points = points);
        bolts_();
        translate([x1l + 7, y1l - 6, 0]) rotate([0,0,30]) cube([1.75,4.5,100]);
    }
    
    //bolts_();
    if (mode == 1) bolts_();
}

module neck_pivot(neck_h, axle_d_from_wall, pivot_angle_min, pivot_angle_max, move, move_xyz, mode){    
    
    pivot_point = [-axle_d_from_wall, neck_h, 0];
    
    module neck_(){
        rotate([90,0,0])
        translate([0,0, -neck_t/2]) 
        union() {
            translate(pivot_point) pivot();
            neck(neck_h, pivot_point, pivot_angle_min, pivot_angle_max, axle_d_from_wall, mode);
        }
    }
    
    
    // horn for servo
    module horn(){
        
        horn_t = 5;
        r_horn = (r_pivot_circle - (thickness_bottom - axle_d_from_wall) - t  - .75)/2;
        horn_x = -r_pivot_circle + r_horn; //- t - 2;
        horn_h = wx_head/2 - r_horn - 2;
        
        translate([horn_x, 0, 0])
        rotate([0,0,-pivot_angle_min])
        difference() {
        hull(){
            translate([0, horn_h, -neck_t/2]) cylinder(r = r_horn, h = horn_t, $fn = 3*a);
            translate([r_horn, 0, -neck_t/2]) cylinder(r = 2*r_horn, h = horn_t, $fn = a);
        }
        translate([0, horn_h, -neck_t/2]) cylinder(r = .75, h = 100, $fn = 3*a, center = true);
        //cylinder(r = neck_axle_d, h = 20, $fn = 3*a, center = true);
        }
    }
    
        color("DarkGrey")   
    if (move==0){
        translate(-pivot_point) rotate([-90,0,0]) neck_();
        horn();
    }
    /*else if (move == 0){
        translate(move_xyz) neck_();
    }*/

}


//neck_h = 20;
//axle_d_from_wall = axle_d/2 + 1;

neck_pivot(neck_h, axle_d_from_wall, neck_pivot_angle_min, neck_pivot_angle_max, 0, [0,0,0], 0);
